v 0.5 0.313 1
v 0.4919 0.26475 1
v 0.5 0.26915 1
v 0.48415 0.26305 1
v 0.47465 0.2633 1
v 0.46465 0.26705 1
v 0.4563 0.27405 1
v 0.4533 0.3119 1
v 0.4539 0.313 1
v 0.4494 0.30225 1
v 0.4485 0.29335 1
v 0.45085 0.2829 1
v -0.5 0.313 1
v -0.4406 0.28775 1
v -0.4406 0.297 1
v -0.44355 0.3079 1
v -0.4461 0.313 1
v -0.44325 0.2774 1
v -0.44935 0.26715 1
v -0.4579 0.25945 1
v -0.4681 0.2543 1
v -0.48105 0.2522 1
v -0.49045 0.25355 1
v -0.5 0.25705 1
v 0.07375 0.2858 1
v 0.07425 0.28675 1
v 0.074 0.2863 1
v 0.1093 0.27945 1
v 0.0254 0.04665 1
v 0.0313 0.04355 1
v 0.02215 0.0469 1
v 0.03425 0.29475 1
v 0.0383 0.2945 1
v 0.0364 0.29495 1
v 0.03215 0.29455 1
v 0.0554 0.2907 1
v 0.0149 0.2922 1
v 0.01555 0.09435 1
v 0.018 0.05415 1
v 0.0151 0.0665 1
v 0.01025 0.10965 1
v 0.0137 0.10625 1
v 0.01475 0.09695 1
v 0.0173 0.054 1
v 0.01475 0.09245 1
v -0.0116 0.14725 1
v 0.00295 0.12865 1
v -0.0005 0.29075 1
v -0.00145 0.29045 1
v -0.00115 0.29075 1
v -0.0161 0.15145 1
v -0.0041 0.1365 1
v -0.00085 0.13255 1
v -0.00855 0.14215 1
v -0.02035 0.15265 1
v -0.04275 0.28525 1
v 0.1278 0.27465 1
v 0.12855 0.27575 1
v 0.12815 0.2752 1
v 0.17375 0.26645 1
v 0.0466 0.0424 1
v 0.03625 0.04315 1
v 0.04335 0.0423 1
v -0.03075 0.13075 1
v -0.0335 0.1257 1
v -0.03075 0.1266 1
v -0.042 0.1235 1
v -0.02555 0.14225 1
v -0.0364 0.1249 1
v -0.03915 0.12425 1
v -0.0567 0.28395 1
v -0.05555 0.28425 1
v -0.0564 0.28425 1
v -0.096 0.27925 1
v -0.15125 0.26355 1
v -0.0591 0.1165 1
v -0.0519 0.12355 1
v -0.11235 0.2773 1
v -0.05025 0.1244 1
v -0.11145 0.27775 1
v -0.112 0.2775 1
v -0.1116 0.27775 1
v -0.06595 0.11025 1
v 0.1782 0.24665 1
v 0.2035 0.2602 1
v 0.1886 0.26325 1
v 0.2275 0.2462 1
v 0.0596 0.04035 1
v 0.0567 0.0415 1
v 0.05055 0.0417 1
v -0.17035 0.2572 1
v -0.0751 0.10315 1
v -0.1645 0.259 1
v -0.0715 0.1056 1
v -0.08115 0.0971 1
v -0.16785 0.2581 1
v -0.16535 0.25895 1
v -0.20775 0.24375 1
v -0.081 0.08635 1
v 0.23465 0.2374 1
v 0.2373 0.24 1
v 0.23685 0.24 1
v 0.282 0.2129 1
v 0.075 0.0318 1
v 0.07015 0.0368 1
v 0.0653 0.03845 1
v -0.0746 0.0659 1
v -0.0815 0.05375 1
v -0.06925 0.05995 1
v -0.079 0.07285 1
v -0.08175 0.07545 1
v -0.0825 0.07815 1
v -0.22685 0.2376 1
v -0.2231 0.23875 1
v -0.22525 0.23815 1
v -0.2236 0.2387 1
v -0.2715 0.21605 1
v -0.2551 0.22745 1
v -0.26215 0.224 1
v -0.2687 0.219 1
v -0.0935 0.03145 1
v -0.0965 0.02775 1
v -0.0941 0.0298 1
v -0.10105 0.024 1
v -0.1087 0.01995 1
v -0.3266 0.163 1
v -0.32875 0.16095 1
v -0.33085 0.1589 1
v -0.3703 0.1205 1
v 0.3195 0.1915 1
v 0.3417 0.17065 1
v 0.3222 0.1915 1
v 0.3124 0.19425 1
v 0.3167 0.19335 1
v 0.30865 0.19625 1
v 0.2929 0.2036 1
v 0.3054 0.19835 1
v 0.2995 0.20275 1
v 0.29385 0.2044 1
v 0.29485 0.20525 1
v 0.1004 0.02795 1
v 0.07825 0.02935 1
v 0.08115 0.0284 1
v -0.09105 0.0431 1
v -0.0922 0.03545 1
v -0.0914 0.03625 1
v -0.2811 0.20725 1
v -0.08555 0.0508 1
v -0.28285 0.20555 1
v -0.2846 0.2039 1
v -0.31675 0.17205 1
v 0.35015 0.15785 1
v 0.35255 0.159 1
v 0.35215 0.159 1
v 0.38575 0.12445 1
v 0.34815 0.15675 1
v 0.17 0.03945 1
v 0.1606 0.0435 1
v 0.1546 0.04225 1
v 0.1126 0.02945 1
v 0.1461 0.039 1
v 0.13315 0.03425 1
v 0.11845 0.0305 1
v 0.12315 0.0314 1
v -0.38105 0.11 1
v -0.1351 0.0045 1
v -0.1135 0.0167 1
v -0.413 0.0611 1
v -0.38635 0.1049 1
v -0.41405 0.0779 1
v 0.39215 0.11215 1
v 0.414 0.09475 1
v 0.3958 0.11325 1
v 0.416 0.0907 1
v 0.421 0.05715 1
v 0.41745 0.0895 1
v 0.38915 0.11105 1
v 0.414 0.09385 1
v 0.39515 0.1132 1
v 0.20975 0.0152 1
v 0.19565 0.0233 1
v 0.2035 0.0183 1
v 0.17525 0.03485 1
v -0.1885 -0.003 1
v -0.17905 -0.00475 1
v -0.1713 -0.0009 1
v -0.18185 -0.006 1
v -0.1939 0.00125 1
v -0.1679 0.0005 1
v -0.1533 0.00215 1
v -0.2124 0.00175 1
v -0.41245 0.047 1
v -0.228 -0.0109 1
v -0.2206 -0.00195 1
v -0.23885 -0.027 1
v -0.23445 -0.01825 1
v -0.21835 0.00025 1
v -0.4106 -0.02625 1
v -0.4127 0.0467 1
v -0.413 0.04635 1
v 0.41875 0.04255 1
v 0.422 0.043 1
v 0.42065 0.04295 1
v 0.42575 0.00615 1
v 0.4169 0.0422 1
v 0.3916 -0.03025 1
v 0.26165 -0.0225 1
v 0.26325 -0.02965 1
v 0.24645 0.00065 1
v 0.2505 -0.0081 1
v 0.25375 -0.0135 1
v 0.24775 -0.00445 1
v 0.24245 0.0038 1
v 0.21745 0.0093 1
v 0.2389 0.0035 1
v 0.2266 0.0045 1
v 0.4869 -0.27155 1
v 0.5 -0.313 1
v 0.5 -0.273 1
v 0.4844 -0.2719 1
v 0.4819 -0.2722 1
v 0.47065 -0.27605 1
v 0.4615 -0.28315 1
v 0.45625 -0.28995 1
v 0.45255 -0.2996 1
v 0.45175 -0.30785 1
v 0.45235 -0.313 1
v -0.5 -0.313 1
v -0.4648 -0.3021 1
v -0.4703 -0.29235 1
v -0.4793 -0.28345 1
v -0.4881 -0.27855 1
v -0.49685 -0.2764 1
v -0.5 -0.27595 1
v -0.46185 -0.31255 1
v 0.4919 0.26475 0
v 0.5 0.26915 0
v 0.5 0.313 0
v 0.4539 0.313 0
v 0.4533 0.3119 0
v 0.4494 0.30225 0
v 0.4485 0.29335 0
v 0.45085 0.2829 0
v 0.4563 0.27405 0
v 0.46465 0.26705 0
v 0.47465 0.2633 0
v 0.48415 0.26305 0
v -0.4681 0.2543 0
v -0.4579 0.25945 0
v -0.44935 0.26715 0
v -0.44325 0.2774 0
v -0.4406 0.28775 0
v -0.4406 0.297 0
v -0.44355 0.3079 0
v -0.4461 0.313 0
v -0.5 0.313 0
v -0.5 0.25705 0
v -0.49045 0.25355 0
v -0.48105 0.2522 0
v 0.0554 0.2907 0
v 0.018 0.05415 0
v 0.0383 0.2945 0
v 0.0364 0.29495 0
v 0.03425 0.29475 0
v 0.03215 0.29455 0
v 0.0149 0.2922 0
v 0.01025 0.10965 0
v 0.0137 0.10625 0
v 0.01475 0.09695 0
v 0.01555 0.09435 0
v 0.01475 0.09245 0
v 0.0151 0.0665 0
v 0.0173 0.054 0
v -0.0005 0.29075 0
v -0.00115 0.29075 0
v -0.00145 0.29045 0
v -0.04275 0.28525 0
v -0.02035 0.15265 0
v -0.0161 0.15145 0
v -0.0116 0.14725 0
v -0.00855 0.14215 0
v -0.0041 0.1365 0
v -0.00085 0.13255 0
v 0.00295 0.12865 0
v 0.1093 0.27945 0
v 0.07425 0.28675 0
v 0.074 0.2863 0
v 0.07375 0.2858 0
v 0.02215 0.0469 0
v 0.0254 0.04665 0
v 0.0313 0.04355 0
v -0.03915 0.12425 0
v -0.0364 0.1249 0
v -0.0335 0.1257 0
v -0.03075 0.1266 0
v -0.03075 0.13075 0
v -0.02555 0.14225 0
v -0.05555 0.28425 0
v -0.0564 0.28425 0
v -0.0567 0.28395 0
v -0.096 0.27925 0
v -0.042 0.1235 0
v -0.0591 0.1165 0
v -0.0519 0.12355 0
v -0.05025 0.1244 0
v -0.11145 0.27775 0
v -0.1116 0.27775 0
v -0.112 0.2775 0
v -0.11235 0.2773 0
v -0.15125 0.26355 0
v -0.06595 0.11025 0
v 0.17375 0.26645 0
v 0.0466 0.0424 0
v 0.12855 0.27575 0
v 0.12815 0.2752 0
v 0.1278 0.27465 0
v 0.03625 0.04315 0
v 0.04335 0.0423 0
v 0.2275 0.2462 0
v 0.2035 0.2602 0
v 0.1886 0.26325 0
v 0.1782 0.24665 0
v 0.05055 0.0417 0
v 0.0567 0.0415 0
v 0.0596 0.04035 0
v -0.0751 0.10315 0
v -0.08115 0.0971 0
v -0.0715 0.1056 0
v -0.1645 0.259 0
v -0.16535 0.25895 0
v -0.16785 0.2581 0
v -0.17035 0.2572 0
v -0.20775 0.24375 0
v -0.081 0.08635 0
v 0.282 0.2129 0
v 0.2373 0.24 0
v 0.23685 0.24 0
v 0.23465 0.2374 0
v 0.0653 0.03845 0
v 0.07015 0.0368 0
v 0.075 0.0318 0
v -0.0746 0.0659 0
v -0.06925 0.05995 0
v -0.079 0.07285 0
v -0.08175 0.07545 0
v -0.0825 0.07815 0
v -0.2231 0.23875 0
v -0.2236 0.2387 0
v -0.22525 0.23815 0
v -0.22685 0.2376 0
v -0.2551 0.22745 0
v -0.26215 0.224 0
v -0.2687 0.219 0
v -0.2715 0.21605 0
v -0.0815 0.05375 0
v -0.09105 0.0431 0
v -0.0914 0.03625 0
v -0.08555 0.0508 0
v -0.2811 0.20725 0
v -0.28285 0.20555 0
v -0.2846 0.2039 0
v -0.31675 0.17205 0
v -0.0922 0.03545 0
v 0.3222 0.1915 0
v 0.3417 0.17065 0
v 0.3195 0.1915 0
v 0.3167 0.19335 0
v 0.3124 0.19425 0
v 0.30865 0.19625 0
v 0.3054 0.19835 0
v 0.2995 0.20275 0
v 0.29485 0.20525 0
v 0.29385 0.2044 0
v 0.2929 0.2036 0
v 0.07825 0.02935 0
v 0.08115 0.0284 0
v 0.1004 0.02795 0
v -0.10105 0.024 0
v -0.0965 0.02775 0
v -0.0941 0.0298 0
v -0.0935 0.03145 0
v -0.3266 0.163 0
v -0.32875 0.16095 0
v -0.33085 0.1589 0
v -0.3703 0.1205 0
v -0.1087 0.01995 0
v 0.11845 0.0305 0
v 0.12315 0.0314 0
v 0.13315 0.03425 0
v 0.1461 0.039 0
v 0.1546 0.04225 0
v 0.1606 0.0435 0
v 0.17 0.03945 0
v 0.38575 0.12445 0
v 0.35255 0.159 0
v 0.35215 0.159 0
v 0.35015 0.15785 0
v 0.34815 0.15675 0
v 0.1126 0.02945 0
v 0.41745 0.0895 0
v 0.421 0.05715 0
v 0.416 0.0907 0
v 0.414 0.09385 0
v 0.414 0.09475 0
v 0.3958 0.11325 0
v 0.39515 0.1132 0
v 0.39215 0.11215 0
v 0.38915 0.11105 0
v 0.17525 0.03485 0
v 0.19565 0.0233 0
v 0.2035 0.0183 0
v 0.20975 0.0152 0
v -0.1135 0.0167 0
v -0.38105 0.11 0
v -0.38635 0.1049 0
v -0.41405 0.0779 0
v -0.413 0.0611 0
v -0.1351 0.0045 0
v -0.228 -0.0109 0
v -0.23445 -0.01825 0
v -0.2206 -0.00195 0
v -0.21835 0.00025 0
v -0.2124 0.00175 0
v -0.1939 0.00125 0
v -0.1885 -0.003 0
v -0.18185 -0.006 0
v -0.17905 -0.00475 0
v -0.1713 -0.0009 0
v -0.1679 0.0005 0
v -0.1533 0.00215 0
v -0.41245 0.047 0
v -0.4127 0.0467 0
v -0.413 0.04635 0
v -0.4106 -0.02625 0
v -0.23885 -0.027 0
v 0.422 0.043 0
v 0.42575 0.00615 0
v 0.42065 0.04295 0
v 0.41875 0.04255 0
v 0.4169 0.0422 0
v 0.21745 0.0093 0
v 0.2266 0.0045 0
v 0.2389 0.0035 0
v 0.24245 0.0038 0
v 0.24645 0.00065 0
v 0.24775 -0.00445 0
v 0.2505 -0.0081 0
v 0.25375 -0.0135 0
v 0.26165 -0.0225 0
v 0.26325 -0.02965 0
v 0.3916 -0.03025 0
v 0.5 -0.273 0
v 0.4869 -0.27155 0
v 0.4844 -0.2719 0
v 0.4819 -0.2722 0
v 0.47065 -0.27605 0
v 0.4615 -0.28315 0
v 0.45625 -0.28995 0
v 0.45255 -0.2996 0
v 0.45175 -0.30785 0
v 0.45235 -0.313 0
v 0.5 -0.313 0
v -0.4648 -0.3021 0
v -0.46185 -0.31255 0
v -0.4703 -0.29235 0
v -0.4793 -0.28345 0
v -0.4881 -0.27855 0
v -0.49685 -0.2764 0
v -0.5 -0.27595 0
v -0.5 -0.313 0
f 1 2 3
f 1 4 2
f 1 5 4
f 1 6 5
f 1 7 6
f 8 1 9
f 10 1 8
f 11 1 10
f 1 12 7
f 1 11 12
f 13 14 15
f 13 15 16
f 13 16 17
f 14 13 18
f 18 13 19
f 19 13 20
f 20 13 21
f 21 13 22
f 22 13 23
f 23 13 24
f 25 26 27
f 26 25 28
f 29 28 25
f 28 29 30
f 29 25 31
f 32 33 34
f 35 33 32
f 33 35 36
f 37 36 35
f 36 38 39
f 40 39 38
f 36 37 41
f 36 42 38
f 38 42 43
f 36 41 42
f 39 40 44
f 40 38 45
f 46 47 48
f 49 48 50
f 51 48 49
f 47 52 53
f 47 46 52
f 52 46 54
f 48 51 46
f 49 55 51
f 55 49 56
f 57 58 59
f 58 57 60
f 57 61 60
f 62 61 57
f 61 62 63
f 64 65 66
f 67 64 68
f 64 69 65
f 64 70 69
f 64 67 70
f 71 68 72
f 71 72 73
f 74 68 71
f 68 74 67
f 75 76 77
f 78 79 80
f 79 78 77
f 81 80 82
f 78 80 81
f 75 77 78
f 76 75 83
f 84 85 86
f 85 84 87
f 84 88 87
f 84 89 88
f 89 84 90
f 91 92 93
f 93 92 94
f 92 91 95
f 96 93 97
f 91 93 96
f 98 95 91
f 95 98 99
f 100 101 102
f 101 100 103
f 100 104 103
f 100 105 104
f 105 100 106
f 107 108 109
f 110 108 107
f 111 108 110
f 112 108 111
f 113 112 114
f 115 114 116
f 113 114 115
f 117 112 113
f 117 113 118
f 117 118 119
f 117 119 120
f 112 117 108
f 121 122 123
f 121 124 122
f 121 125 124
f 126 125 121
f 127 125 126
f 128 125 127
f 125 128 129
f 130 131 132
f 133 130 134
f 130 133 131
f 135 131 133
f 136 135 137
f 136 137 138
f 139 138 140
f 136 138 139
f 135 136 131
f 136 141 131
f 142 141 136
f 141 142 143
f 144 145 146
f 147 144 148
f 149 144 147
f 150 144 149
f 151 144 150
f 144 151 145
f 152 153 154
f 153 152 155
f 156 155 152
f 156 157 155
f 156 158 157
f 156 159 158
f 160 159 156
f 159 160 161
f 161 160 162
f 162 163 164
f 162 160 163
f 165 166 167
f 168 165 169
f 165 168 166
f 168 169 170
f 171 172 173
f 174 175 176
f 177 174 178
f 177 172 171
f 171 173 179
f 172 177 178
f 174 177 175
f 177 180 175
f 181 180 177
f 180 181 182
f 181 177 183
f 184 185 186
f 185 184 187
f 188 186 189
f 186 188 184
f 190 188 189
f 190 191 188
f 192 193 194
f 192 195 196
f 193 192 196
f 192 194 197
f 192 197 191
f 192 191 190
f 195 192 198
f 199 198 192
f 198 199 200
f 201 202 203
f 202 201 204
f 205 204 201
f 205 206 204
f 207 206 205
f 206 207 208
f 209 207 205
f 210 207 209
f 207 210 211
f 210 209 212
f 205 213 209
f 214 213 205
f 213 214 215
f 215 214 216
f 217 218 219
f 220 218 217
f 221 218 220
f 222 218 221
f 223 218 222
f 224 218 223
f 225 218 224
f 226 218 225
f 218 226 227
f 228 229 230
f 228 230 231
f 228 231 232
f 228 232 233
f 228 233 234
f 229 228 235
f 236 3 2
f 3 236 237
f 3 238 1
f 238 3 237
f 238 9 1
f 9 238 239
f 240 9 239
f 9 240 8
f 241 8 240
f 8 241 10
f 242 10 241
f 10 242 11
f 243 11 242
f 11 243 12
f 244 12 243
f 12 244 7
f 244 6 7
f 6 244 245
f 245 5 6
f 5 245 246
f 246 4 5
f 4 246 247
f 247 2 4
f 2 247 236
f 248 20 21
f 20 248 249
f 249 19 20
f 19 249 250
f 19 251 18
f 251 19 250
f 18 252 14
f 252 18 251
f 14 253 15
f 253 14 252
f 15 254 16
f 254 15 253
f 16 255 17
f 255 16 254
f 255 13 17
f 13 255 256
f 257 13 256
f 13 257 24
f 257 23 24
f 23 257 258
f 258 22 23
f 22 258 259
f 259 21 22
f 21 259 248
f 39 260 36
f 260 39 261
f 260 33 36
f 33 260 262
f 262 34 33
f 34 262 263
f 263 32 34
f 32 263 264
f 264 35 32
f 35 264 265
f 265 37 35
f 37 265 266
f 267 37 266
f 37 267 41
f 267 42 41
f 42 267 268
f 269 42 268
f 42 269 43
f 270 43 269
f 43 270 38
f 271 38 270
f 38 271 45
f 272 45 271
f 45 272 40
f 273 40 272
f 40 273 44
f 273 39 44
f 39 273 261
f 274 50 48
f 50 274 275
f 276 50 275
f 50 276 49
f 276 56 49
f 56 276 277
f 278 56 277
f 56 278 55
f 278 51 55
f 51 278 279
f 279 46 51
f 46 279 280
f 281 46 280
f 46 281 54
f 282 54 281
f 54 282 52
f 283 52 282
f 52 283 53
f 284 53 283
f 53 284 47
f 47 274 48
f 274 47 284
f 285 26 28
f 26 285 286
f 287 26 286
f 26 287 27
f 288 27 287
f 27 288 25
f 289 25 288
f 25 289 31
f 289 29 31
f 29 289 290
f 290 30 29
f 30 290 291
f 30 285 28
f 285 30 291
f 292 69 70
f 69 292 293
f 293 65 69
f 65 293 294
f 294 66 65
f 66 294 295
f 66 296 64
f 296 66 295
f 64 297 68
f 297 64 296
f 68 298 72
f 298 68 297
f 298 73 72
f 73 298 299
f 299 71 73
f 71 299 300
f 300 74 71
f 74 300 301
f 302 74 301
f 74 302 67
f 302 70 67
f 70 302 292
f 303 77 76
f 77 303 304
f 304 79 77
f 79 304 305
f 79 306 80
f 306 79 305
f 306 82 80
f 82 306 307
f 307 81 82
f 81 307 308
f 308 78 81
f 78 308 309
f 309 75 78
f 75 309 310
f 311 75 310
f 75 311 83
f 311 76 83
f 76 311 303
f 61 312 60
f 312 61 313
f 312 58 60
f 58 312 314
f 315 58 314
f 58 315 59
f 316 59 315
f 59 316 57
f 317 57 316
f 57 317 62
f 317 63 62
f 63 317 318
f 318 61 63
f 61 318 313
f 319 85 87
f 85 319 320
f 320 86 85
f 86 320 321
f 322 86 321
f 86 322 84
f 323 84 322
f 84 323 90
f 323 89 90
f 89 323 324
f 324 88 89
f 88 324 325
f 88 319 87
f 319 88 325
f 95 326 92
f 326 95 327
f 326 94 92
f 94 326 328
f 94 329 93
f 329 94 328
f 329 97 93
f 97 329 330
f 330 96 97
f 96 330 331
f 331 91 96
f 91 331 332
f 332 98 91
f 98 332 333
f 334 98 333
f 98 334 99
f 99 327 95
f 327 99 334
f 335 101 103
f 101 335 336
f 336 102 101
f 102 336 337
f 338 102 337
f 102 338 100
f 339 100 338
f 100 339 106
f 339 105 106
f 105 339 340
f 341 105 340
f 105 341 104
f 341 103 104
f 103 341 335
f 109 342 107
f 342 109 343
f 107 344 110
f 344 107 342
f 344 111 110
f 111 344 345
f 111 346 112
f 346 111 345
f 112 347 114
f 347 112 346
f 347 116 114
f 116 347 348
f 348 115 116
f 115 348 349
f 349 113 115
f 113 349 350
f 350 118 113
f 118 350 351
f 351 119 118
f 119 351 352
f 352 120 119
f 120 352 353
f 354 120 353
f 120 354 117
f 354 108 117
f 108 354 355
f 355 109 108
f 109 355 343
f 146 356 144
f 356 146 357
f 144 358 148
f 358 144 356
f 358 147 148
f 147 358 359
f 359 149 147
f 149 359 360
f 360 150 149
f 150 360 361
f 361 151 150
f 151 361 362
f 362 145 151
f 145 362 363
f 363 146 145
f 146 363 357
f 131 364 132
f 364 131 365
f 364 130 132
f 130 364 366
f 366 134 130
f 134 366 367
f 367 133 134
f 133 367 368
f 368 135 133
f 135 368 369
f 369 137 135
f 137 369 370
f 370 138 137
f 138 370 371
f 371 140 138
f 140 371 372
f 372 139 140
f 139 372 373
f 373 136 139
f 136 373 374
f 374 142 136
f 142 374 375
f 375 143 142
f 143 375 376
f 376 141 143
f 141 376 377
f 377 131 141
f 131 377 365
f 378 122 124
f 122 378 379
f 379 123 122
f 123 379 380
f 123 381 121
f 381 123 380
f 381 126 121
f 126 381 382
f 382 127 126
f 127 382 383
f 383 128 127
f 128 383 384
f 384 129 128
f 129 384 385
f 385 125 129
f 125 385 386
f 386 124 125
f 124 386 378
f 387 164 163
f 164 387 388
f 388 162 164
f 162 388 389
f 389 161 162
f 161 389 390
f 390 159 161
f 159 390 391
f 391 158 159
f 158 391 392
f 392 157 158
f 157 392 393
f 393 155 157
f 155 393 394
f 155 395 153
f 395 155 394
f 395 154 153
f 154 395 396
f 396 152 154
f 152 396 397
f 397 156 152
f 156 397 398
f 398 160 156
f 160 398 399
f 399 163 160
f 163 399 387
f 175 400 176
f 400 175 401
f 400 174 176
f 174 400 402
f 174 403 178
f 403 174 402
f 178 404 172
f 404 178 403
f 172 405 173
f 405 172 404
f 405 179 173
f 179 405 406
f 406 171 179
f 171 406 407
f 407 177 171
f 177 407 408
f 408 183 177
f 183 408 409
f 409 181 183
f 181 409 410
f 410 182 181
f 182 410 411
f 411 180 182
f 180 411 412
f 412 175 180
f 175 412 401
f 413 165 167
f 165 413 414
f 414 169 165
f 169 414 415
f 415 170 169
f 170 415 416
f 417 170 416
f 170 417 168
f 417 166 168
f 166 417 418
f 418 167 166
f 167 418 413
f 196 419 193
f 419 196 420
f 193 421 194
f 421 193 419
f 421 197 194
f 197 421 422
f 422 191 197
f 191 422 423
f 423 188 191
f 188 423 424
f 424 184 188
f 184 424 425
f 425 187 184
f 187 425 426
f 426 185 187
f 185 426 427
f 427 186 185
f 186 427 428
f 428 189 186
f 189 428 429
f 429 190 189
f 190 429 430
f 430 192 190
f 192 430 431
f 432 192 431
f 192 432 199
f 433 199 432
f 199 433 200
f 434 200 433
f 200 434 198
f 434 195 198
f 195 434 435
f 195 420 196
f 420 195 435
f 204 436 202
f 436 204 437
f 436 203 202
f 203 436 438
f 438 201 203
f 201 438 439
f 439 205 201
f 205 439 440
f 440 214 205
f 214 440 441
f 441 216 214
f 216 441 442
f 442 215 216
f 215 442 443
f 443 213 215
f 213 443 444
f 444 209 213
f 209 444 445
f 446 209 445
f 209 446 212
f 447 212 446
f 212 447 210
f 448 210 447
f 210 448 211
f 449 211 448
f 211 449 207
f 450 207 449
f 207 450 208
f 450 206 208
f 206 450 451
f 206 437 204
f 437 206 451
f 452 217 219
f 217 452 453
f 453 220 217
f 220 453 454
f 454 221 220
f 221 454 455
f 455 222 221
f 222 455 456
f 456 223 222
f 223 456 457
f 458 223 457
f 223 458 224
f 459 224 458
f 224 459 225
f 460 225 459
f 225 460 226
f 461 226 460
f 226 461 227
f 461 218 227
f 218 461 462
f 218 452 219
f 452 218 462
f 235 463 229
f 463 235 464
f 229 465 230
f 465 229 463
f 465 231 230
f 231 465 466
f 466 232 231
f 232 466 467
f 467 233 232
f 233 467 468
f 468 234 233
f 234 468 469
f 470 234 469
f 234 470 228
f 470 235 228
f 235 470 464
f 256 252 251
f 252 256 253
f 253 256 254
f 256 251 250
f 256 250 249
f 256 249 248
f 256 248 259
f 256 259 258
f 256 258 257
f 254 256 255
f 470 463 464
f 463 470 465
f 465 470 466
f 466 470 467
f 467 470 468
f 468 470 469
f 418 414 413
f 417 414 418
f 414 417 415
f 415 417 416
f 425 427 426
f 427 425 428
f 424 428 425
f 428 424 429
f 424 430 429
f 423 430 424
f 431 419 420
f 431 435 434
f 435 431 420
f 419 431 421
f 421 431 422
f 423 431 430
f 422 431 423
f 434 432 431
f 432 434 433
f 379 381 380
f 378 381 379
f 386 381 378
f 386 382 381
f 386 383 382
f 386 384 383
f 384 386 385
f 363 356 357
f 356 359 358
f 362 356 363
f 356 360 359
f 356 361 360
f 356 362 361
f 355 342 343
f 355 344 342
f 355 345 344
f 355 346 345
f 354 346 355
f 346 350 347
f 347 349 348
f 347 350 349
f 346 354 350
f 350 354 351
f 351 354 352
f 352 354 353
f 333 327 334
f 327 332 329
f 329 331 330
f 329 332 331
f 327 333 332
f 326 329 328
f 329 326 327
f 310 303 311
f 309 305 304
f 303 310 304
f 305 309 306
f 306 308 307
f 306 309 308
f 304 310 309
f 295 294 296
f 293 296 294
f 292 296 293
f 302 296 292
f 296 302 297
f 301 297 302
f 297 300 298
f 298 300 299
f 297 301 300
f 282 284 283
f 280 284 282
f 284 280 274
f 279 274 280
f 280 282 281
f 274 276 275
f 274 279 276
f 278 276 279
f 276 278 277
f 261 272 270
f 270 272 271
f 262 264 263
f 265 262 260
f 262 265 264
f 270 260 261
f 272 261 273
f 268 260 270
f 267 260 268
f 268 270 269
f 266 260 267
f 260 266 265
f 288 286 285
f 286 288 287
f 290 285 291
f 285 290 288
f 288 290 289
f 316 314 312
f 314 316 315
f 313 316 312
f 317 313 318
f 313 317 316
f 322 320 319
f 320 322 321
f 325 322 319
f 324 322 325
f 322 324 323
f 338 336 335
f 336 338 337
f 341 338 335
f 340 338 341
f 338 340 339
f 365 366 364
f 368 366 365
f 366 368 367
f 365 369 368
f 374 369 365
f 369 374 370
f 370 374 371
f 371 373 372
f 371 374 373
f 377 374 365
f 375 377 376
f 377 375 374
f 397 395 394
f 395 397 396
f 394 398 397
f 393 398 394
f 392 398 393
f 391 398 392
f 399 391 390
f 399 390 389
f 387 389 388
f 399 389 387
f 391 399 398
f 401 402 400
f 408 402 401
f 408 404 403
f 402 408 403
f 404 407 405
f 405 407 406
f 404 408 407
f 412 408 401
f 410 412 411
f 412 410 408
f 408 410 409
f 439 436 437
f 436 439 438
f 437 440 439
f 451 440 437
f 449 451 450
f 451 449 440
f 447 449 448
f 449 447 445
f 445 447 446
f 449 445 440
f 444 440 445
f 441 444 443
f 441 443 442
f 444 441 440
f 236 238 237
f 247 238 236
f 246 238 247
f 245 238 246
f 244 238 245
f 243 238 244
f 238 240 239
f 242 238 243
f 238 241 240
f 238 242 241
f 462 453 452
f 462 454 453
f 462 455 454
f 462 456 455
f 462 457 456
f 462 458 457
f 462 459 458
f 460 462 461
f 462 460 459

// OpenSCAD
module fan7red_1()
{
 /* Generated by trace2scad version 20150415
    http://aggregate.org/MAKE/TRACE2SCAD/
    Optimized model has 243/3466 original points
 */
 color([0.5, 0.5, 0.5])
 assign(minx=0) /* polygon minx=0 */
 assign(miny=0) /* polygon miny=0 */
 assign(maxx=20000) /* polygon maxx=20000 */
 assign(maxy=12520) /* polygon maxy=12520 */
 assign(dx=maxx-minx)
 assign(dy=maxy-miny)
 assign(maxd=((dx>dy)?dx:dy))
 scale([1/maxd, 1/maxd, 1])
 translate([-minx-dx/2, -miny-dy/2, 0])
 linear_extrude(height=1, convexity=243)
 union() {
  union() {
   polygon([[0,11961],[0,11401],[191,11331],[379,11304],[638,11346],[842,11449],[1013,11603],[1135,11808],[1188,12015],[1188,12200],[1129,12418],[1078,12520],[0,12520]], convexity=5);
   polygon([[19072,12509],[19066,12498],[18988,12305],[18970,12127],[19017,11918],[19126,11741],[19293,11601],[19493,11526],[19683,11521],[19838,11555],[20000,11643],[20000,12520],[19078,12520]], convexity=6);
   polygon([[10685,12155],[10643,12151],[10298,12104],[10205,8453],[10274,8385],[10295,8199],[10311,8147],[10295,8109],[10302,7590],[10346,7340],[10360,7343],[11108,12074],[10766,12150],[10728,12159]], convexity=8);
   polygon([[9974,12072],[9971,12069],[9145,11965],[9593,9313],[9678,9289],[9768,9205],[9829,9103],[9918,8990],[9983,8911],[10059,8833],[9990,12075],[9977,12075]], convexity=5);
   polygon([[11480,11986],[11475,11976],[10443,7198],[10508,7193],[10626,7131],[12186,11849],[11485,11995]], convexity=6);
   polygon([[8869,11942],[8866,11939],[8080,11845],[9160,8730],[9217,8745],[9272,8758],[9330,8774],[9385,8792],[9385,8875],[9489,9105],[8889,11945],[8872,11945]], convexity=6);
   polygon([[7760,11810],[7753,11806],[6975,11531],[8681,8465],[8818,8590],[8962,8731],[8995,8748],[7771,11815],[7768,11815]], convexity=6);
   polygon([[12563,11764],[12556,11753],[10725,7123],[10867,7106],[10932,7108],[13475,11589],[12571,11775]], convexity=6);
   polygon([[13668,11359],[13564,11193],[11011,7094],[11134,7090],[11192,7067],[14550,11184],[14070,11464],[13772,11525]], convexity=6);
   polygon([[6643,11422],[6593,11404],[5845,11135],[8380,7987],[8377,8202],[8498,8323],[8570,8372],[6710,11440],[6693,11439]], convexity=8);
   polygon([[14715,11034],[14693,11008],[11306,7029],[11403,6996],[11500,6896],[15640,10518],[14746,11060],[14737,11060]], convexity=6);
   polygon([[5495,11023],[5463,11012],[4898,10809],[4757,10740],[4626,10640],[4570,10581],[8370,7335],[8615,7459],[8508,7578],[8420,7717],[8365,7769],[8350,7823],[5538,11035],[5528,11034]], convexity=7);
   polygon([[4343,10371],[4308,10338],[3665,9701],[8156,6969],[8172,6985],[8179,7122],[8289,7276],[4378,10405]], convexity=6);
   polygon([[15877,10348],[15858,10332],[11565,6847],[11623,6828],[12008,6819],[16834,9673],[16444,10090],[16390,10090],[16334,10127],[16248,10145],[16173,10185],[16108,10227],[15990,10315],[15897,10365]], convexity=6);
   polygon([[3425,9479],[3383,9438],[2594,8670],[7826,6659],[7979,6740],[8070,6815],[8118,6856],[8130,6889],[3468,9520]], convexity=6);
   polygon([[17003,9417],[16963,9395],[12252,6849],[12369,6870],[12463,6888],[12663,6945],[12922,7040],[13092,7105],[13212,7130],[13400,7049],[17715,8749],[17051,9440],[17043,9440]], convexity=7);
   polygon([[17843,8503],[17783,8481],[13505,6957],[13913,6726],[14070,6626],[14195,6564],[18420,7403],[18349,8050],[18320,8074],[18280,8137],[18280,8155],[17916,8525],[17903,8524]], convexity=9);
   polygon([[2326,8409],[2273,8358],[1719,7818],[1740,7482],[7298,6350],[7730,6594],[2379,8460]], convexity=6);
   polygon([[1746,7194],[1740,7187],[1788,5735],[5223,5720],[5311,5895],[5440,6042],[5588,6221],[5633,6265],[5752,6295],[6122,6285],[6230,6200],[6363,6140],[6419,6165],[6574,6242],[6642,6270],[6934,6303],[1751,7200]], convexity=8);
   polygon([[18375,7111],[18338,7104],[14349,6446],[14532,6350],[14778,6330],[14849,6336],[14929,6273],[14955,6171],[15010,6098],[15075,5990],[15233,5810],[15265,5667],[17832,5655],[18515,6383],[18440,7120],[18413,7119]], convexity=9);
   polygon([[19688,822],[19638,816],[19413,739],[19230,597],[19125,461],[19051,268],[19035,103],[19047,0],[20000,0],[20000,800],[19738,829]], convexity=6);
   polygon([[0,371],[0,0],[763,9],[704,218],[594,413],[414,591],[238,689],[63,732],[0,741]], convexity=5);
  }
 }
}

module fan7red()
{
 /* all layers combined, scaled to within a 1mm cube */
 scale([1, 1, 1/1])
 difference() {
  union() {
   scale([1,1,2]) translate([0,0,-0.5]) fan7red_1();
  }
  translate([0,0,-2]) cube([2,2,4],center=true);
 }
}
fan7red();
